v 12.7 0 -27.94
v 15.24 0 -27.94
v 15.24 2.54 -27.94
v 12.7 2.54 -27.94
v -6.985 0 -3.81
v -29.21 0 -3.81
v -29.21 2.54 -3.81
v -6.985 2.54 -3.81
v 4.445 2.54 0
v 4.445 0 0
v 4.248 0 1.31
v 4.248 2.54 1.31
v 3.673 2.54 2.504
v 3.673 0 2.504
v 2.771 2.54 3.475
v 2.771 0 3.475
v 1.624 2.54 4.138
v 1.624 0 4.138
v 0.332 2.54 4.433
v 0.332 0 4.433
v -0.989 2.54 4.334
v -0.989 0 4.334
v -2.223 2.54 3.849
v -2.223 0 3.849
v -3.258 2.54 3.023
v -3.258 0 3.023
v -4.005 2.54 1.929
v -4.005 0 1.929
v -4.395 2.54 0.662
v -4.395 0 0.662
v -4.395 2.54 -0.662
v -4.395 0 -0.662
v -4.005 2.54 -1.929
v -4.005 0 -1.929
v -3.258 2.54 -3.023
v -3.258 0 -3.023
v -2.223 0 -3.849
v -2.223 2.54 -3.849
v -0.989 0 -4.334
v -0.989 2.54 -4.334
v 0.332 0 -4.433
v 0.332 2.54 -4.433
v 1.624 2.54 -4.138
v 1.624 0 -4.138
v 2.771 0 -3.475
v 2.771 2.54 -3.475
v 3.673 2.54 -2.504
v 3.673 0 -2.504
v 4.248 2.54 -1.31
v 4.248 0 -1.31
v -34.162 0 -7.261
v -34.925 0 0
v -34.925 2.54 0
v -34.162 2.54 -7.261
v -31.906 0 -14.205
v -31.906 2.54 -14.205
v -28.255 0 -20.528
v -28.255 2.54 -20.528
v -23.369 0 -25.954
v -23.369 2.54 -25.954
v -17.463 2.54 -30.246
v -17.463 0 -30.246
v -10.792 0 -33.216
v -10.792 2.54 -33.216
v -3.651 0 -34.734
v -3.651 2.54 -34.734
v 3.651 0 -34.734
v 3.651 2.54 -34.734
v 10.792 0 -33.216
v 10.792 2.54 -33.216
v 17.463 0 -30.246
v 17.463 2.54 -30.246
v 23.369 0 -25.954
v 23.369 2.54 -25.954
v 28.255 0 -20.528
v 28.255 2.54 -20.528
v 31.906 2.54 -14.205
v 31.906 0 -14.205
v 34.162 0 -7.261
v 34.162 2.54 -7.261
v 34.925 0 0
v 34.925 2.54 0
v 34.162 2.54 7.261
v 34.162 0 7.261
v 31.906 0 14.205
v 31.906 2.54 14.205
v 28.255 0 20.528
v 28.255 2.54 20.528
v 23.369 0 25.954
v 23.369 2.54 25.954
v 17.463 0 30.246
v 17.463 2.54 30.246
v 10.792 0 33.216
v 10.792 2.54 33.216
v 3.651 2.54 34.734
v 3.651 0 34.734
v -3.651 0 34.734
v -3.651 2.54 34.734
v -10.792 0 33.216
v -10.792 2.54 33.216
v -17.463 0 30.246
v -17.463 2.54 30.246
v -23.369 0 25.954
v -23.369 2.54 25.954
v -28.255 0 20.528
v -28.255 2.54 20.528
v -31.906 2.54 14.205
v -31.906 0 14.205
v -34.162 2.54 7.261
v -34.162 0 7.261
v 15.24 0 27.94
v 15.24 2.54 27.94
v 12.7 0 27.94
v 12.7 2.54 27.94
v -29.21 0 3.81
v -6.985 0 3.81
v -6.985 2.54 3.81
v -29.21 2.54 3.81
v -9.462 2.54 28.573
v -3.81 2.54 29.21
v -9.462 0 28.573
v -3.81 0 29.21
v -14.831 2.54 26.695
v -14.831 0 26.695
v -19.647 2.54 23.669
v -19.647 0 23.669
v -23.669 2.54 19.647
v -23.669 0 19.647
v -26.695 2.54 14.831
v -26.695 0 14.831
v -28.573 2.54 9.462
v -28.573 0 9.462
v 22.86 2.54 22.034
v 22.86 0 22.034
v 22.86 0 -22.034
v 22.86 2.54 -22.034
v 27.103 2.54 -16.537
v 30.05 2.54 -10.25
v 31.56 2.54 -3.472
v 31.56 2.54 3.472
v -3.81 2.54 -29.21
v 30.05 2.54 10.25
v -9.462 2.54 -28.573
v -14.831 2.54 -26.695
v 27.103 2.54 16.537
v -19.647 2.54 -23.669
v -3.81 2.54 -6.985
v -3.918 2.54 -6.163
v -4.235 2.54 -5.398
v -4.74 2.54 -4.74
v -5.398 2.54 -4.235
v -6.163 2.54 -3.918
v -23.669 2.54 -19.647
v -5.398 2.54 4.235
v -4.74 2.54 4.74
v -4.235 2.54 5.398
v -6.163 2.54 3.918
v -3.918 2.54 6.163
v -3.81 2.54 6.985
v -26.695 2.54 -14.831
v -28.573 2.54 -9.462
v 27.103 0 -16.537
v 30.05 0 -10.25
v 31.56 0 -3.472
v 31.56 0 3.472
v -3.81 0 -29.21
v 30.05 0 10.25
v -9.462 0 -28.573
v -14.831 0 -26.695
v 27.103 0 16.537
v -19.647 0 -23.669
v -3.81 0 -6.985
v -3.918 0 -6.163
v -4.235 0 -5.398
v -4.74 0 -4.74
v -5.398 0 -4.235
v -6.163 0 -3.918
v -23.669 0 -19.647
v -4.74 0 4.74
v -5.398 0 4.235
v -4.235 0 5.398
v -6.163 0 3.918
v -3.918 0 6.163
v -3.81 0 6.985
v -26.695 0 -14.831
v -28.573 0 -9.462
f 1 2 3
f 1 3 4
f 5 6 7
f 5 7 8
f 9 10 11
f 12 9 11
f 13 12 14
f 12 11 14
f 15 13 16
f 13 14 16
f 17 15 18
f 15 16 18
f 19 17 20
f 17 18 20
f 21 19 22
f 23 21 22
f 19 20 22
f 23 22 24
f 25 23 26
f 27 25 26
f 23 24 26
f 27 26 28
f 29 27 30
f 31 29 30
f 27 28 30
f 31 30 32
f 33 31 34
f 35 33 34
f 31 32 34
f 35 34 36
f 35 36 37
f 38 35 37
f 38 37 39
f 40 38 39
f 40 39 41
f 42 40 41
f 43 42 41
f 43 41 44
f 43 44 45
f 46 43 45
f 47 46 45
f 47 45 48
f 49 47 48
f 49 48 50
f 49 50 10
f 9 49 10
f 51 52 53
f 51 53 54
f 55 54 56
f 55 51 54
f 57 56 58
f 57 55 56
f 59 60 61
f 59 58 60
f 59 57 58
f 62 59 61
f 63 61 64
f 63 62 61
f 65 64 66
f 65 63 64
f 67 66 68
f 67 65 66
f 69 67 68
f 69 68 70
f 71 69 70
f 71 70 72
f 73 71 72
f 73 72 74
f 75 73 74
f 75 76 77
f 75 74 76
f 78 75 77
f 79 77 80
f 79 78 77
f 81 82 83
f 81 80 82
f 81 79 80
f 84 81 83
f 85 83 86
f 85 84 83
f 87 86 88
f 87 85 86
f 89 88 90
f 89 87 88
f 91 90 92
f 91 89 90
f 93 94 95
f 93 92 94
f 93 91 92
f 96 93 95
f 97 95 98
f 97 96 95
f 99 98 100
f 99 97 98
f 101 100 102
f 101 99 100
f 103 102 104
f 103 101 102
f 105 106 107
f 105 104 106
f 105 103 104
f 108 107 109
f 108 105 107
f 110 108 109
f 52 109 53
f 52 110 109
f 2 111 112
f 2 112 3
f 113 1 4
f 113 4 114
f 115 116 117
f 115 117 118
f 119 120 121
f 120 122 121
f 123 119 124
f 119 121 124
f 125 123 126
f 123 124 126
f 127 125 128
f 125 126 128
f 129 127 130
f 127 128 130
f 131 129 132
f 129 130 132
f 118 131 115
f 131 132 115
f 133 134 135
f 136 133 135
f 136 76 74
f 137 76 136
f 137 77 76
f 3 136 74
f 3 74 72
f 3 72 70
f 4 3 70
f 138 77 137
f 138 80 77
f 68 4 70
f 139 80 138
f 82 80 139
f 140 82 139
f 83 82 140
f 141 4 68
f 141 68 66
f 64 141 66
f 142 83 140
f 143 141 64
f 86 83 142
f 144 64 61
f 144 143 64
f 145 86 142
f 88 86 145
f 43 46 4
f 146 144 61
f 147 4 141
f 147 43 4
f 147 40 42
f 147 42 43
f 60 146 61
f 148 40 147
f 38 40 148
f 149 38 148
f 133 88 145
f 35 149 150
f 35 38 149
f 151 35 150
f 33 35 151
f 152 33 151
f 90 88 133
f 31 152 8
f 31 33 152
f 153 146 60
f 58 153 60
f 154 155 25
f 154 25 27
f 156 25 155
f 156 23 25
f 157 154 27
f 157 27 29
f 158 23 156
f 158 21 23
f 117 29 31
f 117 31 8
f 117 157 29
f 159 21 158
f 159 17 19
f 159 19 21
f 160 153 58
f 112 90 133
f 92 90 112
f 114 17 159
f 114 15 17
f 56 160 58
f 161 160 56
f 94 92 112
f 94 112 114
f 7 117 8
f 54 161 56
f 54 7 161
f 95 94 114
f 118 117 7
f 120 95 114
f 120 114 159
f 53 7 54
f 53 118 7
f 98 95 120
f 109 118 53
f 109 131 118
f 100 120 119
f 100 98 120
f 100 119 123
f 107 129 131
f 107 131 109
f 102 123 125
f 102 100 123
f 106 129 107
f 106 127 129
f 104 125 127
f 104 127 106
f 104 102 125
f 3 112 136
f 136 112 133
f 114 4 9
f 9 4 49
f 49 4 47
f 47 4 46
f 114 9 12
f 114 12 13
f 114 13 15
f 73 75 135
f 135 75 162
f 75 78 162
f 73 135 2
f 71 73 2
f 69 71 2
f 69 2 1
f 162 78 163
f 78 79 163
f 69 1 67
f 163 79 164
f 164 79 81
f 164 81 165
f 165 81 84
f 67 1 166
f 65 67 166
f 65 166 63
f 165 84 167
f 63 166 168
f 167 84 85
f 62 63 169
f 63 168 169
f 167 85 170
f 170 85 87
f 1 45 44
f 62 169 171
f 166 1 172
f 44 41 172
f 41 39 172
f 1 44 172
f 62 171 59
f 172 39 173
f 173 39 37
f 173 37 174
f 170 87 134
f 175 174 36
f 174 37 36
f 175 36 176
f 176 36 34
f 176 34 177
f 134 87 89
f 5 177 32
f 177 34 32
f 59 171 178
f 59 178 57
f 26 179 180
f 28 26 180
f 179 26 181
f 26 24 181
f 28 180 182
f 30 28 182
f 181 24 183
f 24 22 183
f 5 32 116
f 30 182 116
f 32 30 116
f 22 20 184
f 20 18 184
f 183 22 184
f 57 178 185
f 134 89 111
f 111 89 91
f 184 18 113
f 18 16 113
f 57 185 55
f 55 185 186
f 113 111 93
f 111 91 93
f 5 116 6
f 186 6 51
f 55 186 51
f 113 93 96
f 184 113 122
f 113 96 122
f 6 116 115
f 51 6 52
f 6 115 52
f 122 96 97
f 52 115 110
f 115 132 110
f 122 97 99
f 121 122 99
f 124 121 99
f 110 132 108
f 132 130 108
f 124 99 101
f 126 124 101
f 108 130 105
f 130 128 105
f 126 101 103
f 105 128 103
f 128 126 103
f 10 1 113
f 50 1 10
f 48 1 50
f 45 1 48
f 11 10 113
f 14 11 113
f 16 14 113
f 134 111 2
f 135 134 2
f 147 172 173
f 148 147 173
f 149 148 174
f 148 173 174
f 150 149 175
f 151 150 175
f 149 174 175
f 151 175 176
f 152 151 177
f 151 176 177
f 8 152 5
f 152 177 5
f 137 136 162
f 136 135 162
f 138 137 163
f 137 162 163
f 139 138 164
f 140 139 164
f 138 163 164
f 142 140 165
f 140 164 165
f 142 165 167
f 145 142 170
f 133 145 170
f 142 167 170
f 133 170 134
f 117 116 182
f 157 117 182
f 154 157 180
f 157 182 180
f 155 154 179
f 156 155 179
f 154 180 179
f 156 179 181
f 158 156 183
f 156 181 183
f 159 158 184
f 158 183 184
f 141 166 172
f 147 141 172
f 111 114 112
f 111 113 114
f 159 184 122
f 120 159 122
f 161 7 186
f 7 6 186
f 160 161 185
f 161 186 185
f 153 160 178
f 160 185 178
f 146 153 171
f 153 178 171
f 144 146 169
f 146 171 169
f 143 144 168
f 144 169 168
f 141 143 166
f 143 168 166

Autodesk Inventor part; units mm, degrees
ref_plane "YZ Plane" through (0, 0, 0) normal (1, 0, 0) x (0, 1, 0)
ref_plane "XZ Plane" through (0, 0, 0) normal (0, 1, 0) x (-1, 0, 0)
ref_plane "XY Plane" through (0, 0, 0) normal (0, 0, 1) x (1, 0, 0)
sketch "Sketch1" plane through (0, 0, 0) normal (0, 1, 0) x (-1, 0, 0)
  circle A0 centre (0, 0) radius 34.925
  dimension "d0" = 69.85
extrude "Extrusion1" add sketch "Sketch1" along normal blind 2.54
sketch "Sketch2" plane through (0, 0, 0) normal (0, -1, 0) x (1, 0, 0)
  line L0 (0, 0) -> (15.24, 0)
  line L1 (15.24, 0) -> (15.24, -27.94)
  line L2 (15.24, -27.94) -> (12.7, -27.94)
  line L3 (12.7, -27.94) -> (12.7, 27.94)
  line L4 (12.7, 27.94) -> (15.24, 27.94)
  line L5 (15.24, 27.94) -> (15.24, -27.94)
  line L6 (0, 0) -> (0, -3.81)
  line L7 (0, -3.81) -> (-3.81, -3.81)
  arc A0 (-3.81, -6.985) -> (-6.985, -3.81) centre (-6.985, -6.985) ccw
  arc A1 (-29.21, -3.81) -> (-3.81, -29.21) centre (-3.81, -3.81) ccw
  line L8 (-3.81, -3.81) -> (-3.81, -29.21) construction
  line L9 (-3.81, -3.81) -> (-29.21, -3.81) construction
  line L10 (-3.81, -29.21) -> (-3.81, -6.985)
  line L11 (-29.21, -3.81) -> (-6.985, -3.81)
  circle A2 centre (0, 0) radius 34.925 projected
  line L12 (-34.925, 0) -> (0, 0)
  arc A3 (-6.985, 3.81) -> (-3.81, 6.985) centre (-6.985, 6.985) ccw
  arc A4 (-3.81, 29.21) -> (-29.21, 3.81) centre (-3.81, 3.81) ccw
  line L13 (-3.81, 3.81) -> (-3.81, 29.21) construction
  line L14 (-3.81, 3.81) -> (-29.21, 3.81) construction
  line L15 (-6.985, 3.81) -> (-29.21, 3.81)
  line L16 (-3.81, 6.985) -> (-3.81, 29.21)
  line L17 (15.24, 0) -> (22.86, 0)
  line L18 (22.86, 0) -> (22.86, -22.0337)
  line L19 (22.86, 22.0337) -> (22.86, 0)
  arc A5 (15.0804, -27.94) -> (15.24, -27.8533) centre (0, 0) ccw
  arc A6 (22.86, -22.0337) -> (22.86, 22.0337) centre (0, 0) ccw
  arc A7 (15.24, 27.8533) -> (15.0804, 27.94) centre (0, 0) ccw
  circle A8 centre (0, 0) radius 4.445
  dimension "d3" = 15.24
  dimension "d4" = 27.94
  dimension "d5" = 2.54
  dimension "d6" = 55.88
  dimension "d7" = 3.81
  dimension "d8" = 3.81
  dimension "d9" = 25.4
  dimension "d11" = 3.175
  dimension "d13" = 25.4
  dimension "d14" = 90
  dimension "d19" = 7.62
  dimension "d20" = 8.89
extrude "Extrusion2" cut sketch "Sketch2" against normal blind 2.54 contours L12 A8 L0 | L0 A8 L7 L6 | L6 L7 A8 L12 | L19 A6 L18 | L3 L4 A7 L5 L0 | L0 L1 A5 L2 L3 | L1 L2 A5 | A7 L4 L5 | L10 A1 L11 A0 | L15 A4 L16 A3
properties part number "fixpart"
